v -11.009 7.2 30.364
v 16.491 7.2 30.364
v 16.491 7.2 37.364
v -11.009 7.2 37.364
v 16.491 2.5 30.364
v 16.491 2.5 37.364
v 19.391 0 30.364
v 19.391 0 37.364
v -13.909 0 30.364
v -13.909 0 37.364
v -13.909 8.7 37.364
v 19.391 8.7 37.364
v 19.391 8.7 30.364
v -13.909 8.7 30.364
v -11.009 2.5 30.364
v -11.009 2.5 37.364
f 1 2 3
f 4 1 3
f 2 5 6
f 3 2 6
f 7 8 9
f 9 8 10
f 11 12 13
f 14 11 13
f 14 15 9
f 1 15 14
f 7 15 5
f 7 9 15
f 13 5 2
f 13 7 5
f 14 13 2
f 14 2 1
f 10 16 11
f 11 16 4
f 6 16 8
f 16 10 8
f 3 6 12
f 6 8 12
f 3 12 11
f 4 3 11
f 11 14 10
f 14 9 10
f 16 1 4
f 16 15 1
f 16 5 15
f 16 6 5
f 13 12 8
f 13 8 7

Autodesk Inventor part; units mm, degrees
ref_plane "YZ Plane" through (0, 0, 0) normal (1, 0, 0) x (0, 1, 0)
ref_plane "XZ Plane" through (0, 0, 0) normal (0, 1, 0) x (-1, 0, 0)
ref_plane "XY Plane" through (0, 0, 0) normal (0, 0, 1) x (1, 0, 0)
sketch "Sketch1" plane through (0, 0, 0) normal (0, 1, 0) x (-1, 0, 0)
  line L0 (-19.3909, 30.3636) -> (13.9091, 30.3636)
  line L1 (13.9091, 30.3636) -> (13.9091, 37.3636)
  line L2 (13.9091, 37.3636) -> (-19.3909, 37.3636)
  line L3 (-19.3909, 37.3636) -> (-19.3909, 30.3636)
  point P0 (0, 0)
  dimension "d0" = 33.3
  dimension "d1" = 7
extrude "MainBody" add sketch "Sketch1" along normal blind 2.5
sketch "Sketch2" plane through (0, 2.5, 0) normal (0, 1, 0) x (1, 0, 0)
  line L0 (-13.9091, -30.3636) -> (-13.9091, -37.3636) projected
  line L1 (-13.9091, -30.3636) -> (-11.0091, -30.3636)
  line L2 (-11.0091, -30.3636) -> (-11.0091, -37.3636)
  line L3 (-11.0091, -37.3636) -> (-13.9091, -37.3636)
  line L4 (-13.9091, -37.3636) -> (-13.9091, -30.3636)
  line L5 (-13.9091, -37.3636) -> (19.3909, -37.3636) projected
  line L6 (19.3909, -37.3636) -> (19.3909, -30.3636) projected
  line L7 (16.4909, -37.3636) -> (19.3909, -37.3636)
  line L8 (19.3909, -37.3636) -> (19.3909, -30.3636)
  line L9 (19.3909, -30.3636) -> (16.4909, -30.3636)
  line L10 (16.4909, -30.3636) -> (16.4909, -37.3636)
  line L11 (19.3909, -30.3636) -> (-13.9091, -30.3636) projected
  point P0 (0, 0)
  point P1 (-13.9091, -37.3636)
  dimension "ClipWidth" = 2.9
  dimension "d5" = 7
  dimension "d14" = 7
  dimension "d15" = 2.9
  dimension "d16" = 0
  dimension "d34" = 27.5
extrude "ClipHeight" add sketch "Sketch2" along normal blind 6.2 contours L1 L2 L3 L0 | L9 L6 L5 L10
sketch "Sketch4" plane through (-11.0091, 2.5, 37.3636) normal (1, 0, 0) x (0, 0, -1)
  line L0 (7, 0) -> (7, 6.2) projected
  line L1 (0, 0) -> (0, 6.2) projected
  line L2 (7, 6.2) -> (0, 6.2)
  line L3 (0, 6.2) -> (0, 4.7)
  line L4 (0, 4.7) -> (7, 4.7)
  line L5 (7, 4.7) -> (7, 6.2)
  line L6 (7, 6.2) -> (0, 6.2) projected
  point P0 (37.3636, -2.5)
  dimension "d9" = 1.5
extrude "Clip1_Out" add sketch "Sketch4" along normal blind 13.85
sketch "Sketch7" plane through (16.4909, 2.5, 30.3636) normal (-1, 0, 0) x (0, 0, 1)
  line L0 (0, 0) -> (0, 6.2) projected
  line L1 (7, 0) -> (7, 6.2) projected
  line L2 (0, 4.7) -> (7, 4.7)
  line L3 (7, 4.7) -> (7, 6.2)
  line L4 (7, 6.2) -> (0, 6.2)
  line L5 (0, 6.2) -> (0, 4.7)
  point P0 (-30.3636, -2.5)
  dimension "d22" = 1.5
  dimension "d23" = 7
extrude "Clip2_Out" add sketch "Sketch7" along normal blind 13.65
equation "\"d14\" = d5"
equation "\"d15\" = ClipWidth"
properties part number "Clip-on"
